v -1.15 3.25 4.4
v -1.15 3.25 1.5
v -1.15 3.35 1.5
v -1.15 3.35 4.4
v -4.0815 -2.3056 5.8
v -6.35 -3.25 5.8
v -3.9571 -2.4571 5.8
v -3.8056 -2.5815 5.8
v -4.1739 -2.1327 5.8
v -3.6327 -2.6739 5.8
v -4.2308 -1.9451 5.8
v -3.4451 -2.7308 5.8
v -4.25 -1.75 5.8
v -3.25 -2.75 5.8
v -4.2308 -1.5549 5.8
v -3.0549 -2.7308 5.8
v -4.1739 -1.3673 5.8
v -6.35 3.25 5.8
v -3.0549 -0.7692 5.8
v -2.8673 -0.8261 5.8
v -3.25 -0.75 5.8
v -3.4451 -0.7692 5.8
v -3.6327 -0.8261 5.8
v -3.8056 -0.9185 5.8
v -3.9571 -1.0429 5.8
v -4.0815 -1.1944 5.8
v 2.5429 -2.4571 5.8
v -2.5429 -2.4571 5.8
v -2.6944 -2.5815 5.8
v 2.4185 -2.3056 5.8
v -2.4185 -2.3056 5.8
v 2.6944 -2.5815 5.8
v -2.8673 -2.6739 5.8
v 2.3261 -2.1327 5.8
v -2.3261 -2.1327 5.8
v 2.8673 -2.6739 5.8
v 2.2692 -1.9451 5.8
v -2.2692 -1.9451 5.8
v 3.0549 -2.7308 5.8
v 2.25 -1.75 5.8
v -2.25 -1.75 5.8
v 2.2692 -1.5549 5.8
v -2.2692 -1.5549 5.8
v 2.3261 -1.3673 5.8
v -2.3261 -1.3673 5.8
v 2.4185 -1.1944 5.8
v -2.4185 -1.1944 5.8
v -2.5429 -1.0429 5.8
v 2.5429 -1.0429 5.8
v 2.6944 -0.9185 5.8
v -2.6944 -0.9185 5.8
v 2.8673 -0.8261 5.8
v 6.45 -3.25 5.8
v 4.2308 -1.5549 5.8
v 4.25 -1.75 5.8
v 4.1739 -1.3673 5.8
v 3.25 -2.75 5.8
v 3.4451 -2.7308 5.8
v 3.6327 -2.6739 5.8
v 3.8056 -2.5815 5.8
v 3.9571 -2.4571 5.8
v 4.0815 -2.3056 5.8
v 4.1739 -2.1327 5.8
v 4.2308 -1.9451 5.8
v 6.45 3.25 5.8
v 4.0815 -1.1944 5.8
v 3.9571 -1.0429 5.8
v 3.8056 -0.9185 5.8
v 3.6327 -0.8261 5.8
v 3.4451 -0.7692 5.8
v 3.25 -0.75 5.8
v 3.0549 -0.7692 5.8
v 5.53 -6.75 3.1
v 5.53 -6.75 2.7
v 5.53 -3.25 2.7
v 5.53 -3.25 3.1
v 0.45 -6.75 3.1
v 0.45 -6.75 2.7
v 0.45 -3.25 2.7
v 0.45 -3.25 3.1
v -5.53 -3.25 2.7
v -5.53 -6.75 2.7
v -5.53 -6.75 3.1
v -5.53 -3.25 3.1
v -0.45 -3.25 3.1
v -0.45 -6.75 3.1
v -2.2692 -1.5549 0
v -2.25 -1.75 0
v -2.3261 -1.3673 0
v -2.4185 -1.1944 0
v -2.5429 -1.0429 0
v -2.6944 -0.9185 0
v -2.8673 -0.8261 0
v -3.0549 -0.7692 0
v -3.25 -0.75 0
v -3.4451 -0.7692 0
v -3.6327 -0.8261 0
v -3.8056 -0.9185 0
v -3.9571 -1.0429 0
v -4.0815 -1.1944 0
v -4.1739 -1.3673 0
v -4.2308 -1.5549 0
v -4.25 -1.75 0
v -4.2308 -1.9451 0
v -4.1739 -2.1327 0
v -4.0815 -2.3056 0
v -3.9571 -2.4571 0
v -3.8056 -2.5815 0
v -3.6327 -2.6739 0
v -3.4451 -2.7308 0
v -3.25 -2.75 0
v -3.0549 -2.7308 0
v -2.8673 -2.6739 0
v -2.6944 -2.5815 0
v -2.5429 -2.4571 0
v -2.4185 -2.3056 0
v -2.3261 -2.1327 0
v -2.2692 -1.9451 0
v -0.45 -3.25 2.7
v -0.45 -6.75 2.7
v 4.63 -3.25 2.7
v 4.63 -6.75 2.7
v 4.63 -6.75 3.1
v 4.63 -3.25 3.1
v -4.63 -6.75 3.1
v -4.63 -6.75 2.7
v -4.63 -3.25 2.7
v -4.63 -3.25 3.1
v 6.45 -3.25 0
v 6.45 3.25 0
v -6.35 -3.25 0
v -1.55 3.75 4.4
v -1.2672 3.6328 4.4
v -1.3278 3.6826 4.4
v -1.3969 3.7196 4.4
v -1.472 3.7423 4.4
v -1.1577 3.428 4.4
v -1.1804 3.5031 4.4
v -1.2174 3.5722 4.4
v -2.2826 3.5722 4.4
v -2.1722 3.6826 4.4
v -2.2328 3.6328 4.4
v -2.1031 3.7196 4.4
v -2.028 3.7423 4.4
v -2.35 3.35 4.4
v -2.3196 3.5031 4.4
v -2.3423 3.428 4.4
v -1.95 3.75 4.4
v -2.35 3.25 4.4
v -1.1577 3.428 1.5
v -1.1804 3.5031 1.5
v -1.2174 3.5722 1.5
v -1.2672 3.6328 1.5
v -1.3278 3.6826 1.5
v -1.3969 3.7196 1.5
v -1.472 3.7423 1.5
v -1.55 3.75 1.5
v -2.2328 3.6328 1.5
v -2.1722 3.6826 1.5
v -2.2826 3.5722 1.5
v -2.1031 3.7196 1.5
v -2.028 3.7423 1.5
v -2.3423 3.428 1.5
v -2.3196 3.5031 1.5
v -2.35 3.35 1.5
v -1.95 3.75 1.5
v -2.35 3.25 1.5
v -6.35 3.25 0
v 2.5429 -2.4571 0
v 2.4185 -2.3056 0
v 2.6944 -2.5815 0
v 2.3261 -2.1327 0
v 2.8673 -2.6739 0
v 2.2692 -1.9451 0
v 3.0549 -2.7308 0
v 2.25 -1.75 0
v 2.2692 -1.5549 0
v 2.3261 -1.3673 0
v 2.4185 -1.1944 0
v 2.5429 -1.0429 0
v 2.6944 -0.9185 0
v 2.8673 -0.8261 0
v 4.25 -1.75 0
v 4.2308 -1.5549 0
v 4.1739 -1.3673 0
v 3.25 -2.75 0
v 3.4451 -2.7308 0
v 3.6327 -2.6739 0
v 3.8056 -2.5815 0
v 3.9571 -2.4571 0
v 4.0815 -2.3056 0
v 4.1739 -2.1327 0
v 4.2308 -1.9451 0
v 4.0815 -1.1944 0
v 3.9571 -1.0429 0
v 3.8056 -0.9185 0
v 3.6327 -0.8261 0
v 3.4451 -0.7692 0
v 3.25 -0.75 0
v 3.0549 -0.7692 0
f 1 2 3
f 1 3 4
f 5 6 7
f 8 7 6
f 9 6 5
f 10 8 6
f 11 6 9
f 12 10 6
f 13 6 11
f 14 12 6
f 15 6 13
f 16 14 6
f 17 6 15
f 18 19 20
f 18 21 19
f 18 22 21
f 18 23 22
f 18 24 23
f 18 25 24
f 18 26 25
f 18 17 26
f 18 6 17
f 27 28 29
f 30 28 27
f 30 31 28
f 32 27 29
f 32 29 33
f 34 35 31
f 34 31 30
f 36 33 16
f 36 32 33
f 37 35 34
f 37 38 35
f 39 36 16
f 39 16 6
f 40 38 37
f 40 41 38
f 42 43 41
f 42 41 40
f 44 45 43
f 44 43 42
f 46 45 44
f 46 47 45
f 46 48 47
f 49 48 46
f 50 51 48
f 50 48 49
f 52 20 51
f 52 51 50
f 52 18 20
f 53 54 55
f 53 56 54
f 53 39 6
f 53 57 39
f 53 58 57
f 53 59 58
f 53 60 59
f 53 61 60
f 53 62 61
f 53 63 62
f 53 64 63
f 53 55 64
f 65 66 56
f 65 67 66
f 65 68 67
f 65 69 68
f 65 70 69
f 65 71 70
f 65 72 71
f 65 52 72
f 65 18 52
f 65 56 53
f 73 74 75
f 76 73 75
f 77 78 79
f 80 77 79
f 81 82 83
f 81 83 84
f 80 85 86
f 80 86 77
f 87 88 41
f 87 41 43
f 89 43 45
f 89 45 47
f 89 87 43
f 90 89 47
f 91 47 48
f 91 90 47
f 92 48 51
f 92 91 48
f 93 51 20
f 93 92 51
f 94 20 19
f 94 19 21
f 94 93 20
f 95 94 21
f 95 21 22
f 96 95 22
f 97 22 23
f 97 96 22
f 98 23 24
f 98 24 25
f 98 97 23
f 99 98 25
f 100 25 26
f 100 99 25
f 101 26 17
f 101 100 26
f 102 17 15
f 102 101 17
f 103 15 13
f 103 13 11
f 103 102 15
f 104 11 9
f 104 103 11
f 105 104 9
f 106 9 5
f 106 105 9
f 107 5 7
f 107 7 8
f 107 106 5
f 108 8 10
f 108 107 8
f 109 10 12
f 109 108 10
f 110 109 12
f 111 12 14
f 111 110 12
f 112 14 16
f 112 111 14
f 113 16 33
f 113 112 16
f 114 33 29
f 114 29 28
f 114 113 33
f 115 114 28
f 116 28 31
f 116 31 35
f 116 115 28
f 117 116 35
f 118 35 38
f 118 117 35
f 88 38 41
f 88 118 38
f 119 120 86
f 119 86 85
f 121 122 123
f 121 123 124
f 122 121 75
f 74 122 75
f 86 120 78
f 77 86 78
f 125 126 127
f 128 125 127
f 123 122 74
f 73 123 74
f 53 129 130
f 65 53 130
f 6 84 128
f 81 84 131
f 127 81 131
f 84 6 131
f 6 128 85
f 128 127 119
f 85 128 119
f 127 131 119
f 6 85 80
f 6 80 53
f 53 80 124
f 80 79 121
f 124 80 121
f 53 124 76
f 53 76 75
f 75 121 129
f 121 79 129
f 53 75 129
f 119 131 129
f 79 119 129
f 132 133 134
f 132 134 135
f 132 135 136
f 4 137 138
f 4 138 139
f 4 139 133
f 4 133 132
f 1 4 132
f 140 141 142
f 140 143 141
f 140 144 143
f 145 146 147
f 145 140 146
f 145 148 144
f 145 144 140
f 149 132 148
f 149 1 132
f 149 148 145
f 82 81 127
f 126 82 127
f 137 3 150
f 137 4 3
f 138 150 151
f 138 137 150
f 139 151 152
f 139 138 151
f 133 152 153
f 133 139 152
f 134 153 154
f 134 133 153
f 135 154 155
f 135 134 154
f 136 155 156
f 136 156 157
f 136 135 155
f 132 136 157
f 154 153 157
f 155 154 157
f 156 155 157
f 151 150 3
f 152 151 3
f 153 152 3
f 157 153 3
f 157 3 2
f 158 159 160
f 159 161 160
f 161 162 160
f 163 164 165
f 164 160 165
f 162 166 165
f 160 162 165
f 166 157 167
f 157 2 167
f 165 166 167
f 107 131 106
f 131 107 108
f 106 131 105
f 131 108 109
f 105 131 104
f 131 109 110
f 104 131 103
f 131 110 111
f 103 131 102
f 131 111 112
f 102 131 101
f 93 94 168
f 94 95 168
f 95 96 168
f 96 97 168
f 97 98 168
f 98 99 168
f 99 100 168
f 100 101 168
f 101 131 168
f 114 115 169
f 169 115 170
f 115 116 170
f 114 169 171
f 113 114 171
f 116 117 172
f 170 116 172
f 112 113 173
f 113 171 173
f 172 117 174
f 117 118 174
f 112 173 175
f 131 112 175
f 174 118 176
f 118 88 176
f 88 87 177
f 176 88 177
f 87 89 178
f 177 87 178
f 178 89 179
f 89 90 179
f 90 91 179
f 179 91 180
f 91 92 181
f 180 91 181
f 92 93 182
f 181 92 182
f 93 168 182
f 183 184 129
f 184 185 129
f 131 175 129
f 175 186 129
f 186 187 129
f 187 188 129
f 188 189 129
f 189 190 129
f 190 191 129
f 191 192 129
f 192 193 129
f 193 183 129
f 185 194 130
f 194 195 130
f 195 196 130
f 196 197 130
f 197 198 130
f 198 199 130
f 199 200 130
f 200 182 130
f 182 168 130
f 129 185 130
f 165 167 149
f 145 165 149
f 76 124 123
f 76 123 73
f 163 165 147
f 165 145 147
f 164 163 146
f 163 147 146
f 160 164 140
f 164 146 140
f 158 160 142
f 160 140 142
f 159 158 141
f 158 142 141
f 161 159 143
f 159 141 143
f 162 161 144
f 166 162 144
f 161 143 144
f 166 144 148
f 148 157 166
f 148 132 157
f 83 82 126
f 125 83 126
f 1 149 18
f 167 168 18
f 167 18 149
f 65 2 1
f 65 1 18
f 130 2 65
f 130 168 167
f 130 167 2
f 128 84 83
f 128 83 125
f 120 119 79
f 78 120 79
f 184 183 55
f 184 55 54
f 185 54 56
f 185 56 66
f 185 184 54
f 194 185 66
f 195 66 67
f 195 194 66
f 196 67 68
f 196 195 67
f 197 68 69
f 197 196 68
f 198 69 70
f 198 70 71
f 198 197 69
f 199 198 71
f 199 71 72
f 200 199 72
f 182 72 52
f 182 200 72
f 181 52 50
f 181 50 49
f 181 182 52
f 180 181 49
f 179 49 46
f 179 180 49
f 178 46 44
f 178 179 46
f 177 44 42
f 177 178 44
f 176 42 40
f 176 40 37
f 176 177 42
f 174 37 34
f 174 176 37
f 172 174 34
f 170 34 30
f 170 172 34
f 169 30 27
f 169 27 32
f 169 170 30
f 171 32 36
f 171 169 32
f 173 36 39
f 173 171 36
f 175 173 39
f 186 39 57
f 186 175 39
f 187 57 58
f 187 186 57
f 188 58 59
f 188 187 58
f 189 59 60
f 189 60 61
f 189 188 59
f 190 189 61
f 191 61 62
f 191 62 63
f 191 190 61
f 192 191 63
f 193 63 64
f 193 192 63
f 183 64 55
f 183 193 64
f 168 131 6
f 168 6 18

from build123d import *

# Parameters (mm, degrees)
F0_W     = 12.8
F0_H     = 6.5
F0_R     = 1
F1_DEPTH = 5.8
F4_W     = 0.9
F4_H     = 3.5
F5_DEPTH = 0.4
F2_W     = 1.2
F2_H     = 2.9
F6_DEPTH = 0.5
F7_R     = 0.4


with BuildPart() as f1:
    # F0 (on Top) → F1 (new body)
    with BuildSketch(Plane.XY):
        with Locations((0.05, 0)):
            Rectangle(F0_W, F0_H)
        with Locations((-3.25, -1.75)):
            Circle(F0_R, mode=Mode.SUBTRACT)
        with Locations((3.25, -1.75)):
            Circle(F0_R, mode=Mode.SUBTRACT)
    extrude(amount=F1_DEPTH)

    # F4 (on offset) → F5 (join)
    with BuildSketch(Plane.XY.offset(2.7)):
        with Locations((-5.08, -5)):
            Rectangle(F4_W, F4_H)
        with Locations((0, -5)):
            Rectangle(F4_W, F4_H)
        with Locations((5.08, -5)):
            Rectangle(F4_W, F4_H)
    extrude(amount=F5_DEPTH)

    # F2 (on face) → F6 (join)
    with BuildSketch(Plane(origin=(0, 3.25, 0), x_dir=(-1, 0, 0), z_dir=(0, 1, 0))):
        with Locations((1.75, 2.95)):
            Rectangle(F2_W, F2_H)
    extrude(amount=F6_DEPTH)

    # F7
    f7_edges = [f1.edges().sort_by_distance(p)[0] for p in [
        (-2.35, 3.75, 2.95),
        (-1.15, 3.75, 2.95),
    ]]
    fillet(f7_edges, radius=F7_R)


solid = f1.part
